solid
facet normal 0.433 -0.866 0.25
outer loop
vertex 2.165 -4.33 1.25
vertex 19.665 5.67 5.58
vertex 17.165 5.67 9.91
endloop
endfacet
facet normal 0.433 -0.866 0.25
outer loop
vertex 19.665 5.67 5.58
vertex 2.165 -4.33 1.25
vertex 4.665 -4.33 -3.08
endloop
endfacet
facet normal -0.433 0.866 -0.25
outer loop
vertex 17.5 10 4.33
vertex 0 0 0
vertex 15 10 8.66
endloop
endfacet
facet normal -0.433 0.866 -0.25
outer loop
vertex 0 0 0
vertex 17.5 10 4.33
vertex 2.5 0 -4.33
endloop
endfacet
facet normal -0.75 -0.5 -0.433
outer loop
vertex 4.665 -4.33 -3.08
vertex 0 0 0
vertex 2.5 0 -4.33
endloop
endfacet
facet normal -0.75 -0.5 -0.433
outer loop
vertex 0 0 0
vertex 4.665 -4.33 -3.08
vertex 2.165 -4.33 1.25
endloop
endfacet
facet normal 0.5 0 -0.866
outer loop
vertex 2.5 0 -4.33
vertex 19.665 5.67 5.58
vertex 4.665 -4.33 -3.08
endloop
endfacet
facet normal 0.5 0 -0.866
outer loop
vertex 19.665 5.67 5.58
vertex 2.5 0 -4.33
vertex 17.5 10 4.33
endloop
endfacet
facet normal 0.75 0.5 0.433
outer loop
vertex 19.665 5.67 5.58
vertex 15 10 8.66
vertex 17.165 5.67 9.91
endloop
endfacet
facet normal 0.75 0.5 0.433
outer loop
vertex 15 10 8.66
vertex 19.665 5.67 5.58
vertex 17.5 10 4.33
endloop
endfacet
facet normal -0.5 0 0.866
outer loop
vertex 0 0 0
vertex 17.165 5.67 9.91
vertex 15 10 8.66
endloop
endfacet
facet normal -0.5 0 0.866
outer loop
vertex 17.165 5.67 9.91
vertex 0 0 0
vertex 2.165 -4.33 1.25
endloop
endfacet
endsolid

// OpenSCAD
// Generated by generate_scads.py
rotate([60,60,0]) {
  cube(size=[5,20,5], center=false);
}
